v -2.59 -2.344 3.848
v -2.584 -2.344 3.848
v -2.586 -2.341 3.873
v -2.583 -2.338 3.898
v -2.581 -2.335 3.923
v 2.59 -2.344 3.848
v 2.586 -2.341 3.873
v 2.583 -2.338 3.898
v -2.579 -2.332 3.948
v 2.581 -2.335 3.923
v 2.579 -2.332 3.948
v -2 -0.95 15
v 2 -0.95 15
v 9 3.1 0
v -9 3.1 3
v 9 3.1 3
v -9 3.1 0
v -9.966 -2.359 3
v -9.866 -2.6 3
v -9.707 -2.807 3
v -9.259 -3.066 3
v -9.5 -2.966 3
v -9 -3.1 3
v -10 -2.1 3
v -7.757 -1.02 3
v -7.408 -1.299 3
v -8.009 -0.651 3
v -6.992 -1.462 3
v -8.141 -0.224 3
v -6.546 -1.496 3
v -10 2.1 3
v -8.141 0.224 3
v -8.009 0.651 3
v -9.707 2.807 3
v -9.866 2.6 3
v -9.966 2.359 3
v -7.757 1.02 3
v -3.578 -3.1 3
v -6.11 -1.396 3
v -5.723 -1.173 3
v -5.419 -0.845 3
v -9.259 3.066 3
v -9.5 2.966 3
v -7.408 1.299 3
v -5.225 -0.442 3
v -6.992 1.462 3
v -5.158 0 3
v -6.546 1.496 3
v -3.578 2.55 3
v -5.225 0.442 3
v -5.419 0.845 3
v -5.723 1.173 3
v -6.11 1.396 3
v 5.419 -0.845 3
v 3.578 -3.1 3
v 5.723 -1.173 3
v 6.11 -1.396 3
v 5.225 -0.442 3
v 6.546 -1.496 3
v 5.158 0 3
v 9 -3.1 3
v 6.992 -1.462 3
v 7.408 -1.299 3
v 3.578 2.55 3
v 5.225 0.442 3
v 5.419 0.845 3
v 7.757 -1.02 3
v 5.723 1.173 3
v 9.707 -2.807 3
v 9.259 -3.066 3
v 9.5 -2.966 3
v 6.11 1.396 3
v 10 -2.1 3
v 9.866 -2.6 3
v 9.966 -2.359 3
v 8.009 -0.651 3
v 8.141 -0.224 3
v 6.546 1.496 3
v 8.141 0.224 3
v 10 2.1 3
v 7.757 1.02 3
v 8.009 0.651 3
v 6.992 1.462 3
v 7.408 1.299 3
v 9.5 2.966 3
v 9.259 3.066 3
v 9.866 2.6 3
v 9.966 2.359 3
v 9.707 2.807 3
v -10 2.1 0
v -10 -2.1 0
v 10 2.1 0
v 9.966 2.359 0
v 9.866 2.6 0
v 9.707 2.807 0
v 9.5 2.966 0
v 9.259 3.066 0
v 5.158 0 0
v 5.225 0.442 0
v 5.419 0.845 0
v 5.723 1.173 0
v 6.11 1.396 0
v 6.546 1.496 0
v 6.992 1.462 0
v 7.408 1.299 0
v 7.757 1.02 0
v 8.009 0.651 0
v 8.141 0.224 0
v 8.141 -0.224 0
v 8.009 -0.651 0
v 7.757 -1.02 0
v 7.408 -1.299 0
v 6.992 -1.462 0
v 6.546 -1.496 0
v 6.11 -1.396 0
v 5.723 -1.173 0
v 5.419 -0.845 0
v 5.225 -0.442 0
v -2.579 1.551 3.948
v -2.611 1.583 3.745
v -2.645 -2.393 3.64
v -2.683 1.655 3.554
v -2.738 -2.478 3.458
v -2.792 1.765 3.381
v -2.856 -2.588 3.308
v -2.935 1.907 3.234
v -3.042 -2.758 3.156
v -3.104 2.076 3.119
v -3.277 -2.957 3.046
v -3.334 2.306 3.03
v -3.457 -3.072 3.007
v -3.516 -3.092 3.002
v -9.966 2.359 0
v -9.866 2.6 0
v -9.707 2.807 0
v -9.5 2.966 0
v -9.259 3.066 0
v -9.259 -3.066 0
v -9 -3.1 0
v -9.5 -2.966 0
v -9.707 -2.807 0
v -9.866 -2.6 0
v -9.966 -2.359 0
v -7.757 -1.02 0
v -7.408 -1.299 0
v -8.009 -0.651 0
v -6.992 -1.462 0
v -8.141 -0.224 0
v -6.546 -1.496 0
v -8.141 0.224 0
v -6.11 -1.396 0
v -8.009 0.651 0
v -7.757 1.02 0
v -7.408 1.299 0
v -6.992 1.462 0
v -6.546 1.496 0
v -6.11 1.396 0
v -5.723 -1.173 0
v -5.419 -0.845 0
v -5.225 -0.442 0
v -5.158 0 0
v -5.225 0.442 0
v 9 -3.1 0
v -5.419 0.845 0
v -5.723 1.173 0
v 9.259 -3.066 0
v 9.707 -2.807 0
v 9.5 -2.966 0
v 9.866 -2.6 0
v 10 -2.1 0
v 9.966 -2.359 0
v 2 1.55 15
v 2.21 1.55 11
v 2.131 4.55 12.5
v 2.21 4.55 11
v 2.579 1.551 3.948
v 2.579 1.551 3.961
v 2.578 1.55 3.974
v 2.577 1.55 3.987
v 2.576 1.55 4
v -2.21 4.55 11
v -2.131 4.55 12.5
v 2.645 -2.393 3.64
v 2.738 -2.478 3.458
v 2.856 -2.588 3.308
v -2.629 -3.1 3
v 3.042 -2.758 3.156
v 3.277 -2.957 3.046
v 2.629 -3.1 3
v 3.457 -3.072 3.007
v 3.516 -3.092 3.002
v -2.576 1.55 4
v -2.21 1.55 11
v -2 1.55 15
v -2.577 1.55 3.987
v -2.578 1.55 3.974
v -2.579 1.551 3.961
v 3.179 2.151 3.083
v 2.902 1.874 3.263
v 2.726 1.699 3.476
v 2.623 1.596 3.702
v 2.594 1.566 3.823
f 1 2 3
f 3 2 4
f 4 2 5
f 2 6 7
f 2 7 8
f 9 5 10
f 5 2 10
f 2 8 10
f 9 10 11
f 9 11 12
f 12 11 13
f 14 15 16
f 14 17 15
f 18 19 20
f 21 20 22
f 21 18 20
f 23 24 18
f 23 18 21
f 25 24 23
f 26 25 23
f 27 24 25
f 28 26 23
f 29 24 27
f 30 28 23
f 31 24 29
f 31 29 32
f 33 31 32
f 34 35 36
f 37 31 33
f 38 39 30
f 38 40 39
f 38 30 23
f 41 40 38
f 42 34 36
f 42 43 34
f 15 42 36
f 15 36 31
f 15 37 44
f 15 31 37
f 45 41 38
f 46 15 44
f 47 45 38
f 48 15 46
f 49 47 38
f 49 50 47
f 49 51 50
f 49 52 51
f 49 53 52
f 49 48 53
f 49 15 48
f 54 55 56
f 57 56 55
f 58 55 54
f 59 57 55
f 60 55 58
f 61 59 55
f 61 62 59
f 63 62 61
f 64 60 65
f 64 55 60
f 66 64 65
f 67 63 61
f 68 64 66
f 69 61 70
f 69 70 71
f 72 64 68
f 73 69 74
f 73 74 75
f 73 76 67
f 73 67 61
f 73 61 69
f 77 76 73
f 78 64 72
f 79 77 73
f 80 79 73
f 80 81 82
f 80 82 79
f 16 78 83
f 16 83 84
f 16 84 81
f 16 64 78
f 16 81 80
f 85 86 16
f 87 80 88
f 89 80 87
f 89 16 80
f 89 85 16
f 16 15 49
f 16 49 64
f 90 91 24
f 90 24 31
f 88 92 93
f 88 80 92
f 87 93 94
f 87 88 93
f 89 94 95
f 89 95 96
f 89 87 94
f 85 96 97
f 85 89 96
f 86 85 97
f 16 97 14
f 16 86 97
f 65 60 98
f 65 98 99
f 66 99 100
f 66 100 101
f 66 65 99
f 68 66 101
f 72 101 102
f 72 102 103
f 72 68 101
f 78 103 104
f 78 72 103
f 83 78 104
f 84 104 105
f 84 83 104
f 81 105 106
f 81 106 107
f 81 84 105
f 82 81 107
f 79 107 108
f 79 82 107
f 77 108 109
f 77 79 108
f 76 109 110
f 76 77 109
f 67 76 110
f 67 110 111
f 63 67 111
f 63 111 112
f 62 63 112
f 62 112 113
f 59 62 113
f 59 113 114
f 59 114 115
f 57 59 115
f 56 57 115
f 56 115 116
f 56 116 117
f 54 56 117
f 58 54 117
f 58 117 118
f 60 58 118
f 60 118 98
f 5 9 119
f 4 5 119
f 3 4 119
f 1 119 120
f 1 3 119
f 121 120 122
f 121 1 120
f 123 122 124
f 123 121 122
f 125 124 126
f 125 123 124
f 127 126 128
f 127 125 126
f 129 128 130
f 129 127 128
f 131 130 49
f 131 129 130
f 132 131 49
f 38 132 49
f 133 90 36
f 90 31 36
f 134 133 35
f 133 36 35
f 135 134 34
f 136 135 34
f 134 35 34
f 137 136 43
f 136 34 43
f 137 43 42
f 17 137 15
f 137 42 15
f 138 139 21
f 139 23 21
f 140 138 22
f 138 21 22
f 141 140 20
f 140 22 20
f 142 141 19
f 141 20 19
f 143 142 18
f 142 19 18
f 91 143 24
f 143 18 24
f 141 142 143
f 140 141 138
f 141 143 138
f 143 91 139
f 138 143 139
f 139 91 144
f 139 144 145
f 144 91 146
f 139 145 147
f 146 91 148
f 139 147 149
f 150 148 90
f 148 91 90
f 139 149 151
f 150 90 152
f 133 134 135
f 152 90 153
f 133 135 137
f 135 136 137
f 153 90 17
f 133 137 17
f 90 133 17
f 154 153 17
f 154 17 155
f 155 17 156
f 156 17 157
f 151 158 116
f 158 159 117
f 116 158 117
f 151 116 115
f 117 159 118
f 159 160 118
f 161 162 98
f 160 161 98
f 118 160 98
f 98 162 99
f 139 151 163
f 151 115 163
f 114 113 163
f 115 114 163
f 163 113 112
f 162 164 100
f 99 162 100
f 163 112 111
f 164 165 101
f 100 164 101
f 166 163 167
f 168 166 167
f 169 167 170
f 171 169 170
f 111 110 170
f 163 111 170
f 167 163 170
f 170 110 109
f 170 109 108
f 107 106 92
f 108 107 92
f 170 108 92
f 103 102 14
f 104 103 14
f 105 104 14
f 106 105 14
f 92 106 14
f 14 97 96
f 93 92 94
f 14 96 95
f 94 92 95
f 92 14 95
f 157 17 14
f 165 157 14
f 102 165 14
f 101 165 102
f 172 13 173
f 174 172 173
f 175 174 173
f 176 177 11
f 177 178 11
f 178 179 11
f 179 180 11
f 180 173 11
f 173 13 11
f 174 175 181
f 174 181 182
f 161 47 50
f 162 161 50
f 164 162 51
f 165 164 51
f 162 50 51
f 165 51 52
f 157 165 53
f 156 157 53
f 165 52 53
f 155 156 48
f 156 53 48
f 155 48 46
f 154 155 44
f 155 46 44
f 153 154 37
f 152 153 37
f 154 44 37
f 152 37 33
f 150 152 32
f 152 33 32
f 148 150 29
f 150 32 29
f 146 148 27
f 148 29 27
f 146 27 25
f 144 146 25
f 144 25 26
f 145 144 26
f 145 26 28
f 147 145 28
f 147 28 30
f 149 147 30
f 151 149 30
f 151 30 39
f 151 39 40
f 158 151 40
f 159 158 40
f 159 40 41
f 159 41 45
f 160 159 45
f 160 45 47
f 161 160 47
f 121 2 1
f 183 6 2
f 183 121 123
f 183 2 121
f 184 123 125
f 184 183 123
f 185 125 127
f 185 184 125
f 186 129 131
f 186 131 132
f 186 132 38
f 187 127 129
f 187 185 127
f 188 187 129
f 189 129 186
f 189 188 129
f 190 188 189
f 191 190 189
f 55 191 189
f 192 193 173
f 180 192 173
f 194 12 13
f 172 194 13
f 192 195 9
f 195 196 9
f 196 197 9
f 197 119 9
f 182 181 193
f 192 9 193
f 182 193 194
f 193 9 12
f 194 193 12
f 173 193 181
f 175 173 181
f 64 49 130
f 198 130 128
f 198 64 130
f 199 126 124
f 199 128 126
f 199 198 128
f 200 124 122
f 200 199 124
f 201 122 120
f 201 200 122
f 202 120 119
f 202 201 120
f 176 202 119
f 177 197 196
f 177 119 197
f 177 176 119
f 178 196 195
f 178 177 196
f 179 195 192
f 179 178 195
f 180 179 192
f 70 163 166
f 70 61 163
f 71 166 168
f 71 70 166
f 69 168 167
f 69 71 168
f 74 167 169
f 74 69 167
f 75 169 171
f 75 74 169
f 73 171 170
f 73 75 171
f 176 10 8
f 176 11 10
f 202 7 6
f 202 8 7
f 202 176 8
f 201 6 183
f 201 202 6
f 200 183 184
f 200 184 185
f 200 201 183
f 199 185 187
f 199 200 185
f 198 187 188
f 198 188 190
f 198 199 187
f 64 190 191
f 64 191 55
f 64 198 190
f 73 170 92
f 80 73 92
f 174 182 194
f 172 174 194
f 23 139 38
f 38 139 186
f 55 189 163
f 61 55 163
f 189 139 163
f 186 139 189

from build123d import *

# Parameters (mm, degrees)
SKETCH1_W           = 20
SKETCH1_H           = 6.2
BOSS_EXTRUDE1_DEPTH = 3
SNAP_START          = -0.95
SNAP_HOOK1_DEPTH    = 2.5
SNAP_START_2        = -1.274844
SNAP_HOOK1_2_DEPTH  = 2.48
SNAP_START_3        = -2.209631117
SNAP_HOOK1_3_DEPTH  = 4.419262234
SNAP_START_4        = -2.628893351
SNAP_HOOK1_4_DEPTH  = 5.257786702
SNAP_START_5        = -3
SNAP_HOOK1_5_DEPTH  = 9
FILLET1_R           = 1
CUT_EXTRUDE1_REACH  = 18.27
SKETCH3_R           = 1.5
FILLET2_R           = 1


with BuildPart() as part:
    # Sketch1 → Boss-Extrude1 (new body)
    with BuildSketch(Plane.XY):
        Rectangle(SKETCH1_W, SKETCH1_H)
    extrude(amount=BOSS_EXTRUDE1_DEPTH)

    # Snap Hook1: read off the stored shape, not the designer's step
    # Snap Hook1 outline → Snap Hook1 (add)
    with BuildSketch(Plane(origin=(0, 0, 0), x_dir=(1, 0, 0), z_dir=(0, 1, 0)).offset(SNAP_START)):
        Polygon((2.628893351, -3), (-2.628893351, -3), (-2, -15), (2, -15), align=None)
    extrude(amount=SNAP_HOOK1_DEPTH)

    # Snap Hook1 2 outline → Snap Hook1 2 (add)
    with BuildSketch(Plane(origin=(0, 0, 0), x_dir=(1, 0, 0), z_dir=(0, 1, 0)).offset(SNAP_START_2)):
        Polygon((2.628893351, -3), (-2.628893351, -3), (-2.209631117, -11), (2.209631117, -11), align=None)
    extrude(amount=SNAP_HOOK1_2_DEPTH)

    # Snap Hook1 3 outline → Snap Hook1 3 (add)
    with BuildSketch(Plane.YZ.offset(SNAP_START_3)):
        Polygon((-0.95, 11), (-0.95, 15), (-2.45, 3), (-1.274844, 3), (-1.274844, 11), align=None)
        Polygon((1.55, 15), (1.55, 11), (4.55, 11), (4.55, 12.5), align=None)
    extrude(amount=SNAP_HOOK1_3_DEPTH)

    # Snap Hook1 4 outline → Snap Hook1 4 (add)
    with BuildSketch(Plane.YZ.offset(SNAP_START_4)):
        Polygon((-0.95, 11), (-0.95, 15), (-2.45, 3), (-1.274844, 3), (-1.274844, 11), align=None)
    extrude(amount=SNAP_HOOK1_4_DEPTH)

    # Snap Hook1 5 outline → Snap Hook1 5 (cut)
    with BuildSketch(Plane(origin=(0, 0, 0), x_dir=(1, 0, 0), z_dir=(0, 1, 0)).offset(SNAP_START_5)):
        Polygon((-2.628893351, -3), (-2.628893351, -16), (-1.947592221, -16), (-2, -15), align=None)
        Polygon((2, -15), (1.947592221, -16), (2.628893351, -16), (2.628893351, -3), align=None)
    extrude(amount=SNAP_HOOK1_5_DEPTH, mode=Mode.SUBTRACT)

    # Fillet1
    # the kernel refuses this fillet: 1 mm, written as the material it adds along each edge
    with BuildSketch(Plane(origin=(5.128893351, 1.55, 3), x_dir=(0, 1, 0), z_dir=(-1, 0, 0))) as fillet1_piece_1_section:
        with BuildLine():
            CenterArc((FILLET1_R, -FILLET1_R), FILLET1_R, 90, 90)
            Line((0, -FILLET1_R), (-FILLET1_R * 0.02, -FILLET1_R))
            Line((-FILLET1_R * 0.02, -FILLET1_R), (-FILLET1_R * 0.02, FILLET1_R * 0.02))
            Line((-FILLET1_R * 0.02, FILLET1_R * 0.02), (FILLET1_R, FILLET1_R * 0.02))
            Line((FILLET1_R, FILLET1_R * 0.02), (FILLET1_R, 0))
        make_face()
    fillet1_piece_1 = extrude(amount=10.257786702, mode=Mode.PRIVATE)
    fillet1_piece_1 = split(fillet1_piece_1, bisect_by=Plane(origin=(-2.607644367, 1.55, 3.405454761), z_dir=(0.9986295347562985, 0, -0.05233595621003828)), keep=Keep.TOP, mode=Mode.PRIVATE)
    fillet1_piece_1 = split(fillet1_piece_1, bisect_by=Plane(origin=(2.635740982, 1.55, 2.869339421), z_dir=(-0.9986295347562985, 0, -0.0523359562100383)), keep=Keep.TOP, mode=Mode.PRIVATE)
    add(fillet1_piece_1)
    with BuildSketch(Plane(origin=(2.628893351, 1.55, 3), x_dir=(1, 0, 0), z_dir=(0, -1, 0))) as fillet1_piece_2_section:
        with BuildLine():
            CenterArc((FILLET1_R * 0.948964566746, FILLET1_R), FILLET1_R, 182.999999998, 87.000000002)
            Line((-FILLET1_R * 0.0496649680101, FILLET1_R * 0.94766404379), (-FILLET1_R * 0.0696375587052, FILLET1_R * 0.946617324666))
            Line((-FILLET1_R * 0.0696375587052, FILLET1_R * 0.946617324666), (-FILLET1_R * 0.0189792913349, -FILLET1_R * 0.02))
            Line((-FILLET1_R * 0.0189792913349, -FILLET1_R * 0.02), (FILLET1_R * 0.948964566746, -FILLET1_R * 0.02))
            Line((FILLET1_R * 0.948964566746, -FILLET1_R * 0.02), (FILLET1_R * 0.948964566746, 0))
        make_face()
    fillet1_piece_2 = extrude(amount=6.372411417, mode=Mode.PRIVATE)
    fillet1_piece_2 = split(fillet1_piece_2, bisect_by=Plane(origin=(2.628893351, -2.388461538, 3.492307692), z_dir=(0, 0.9922778767136677, -0.12403473458920848)), keep=Keep.TOP, mode=Mode.PRIVATE)
    add(fillet1_piece_2)
    with BuildSketch(Plane(origin=(4.76448426, -2.45, 3), x_dir=(0, -1, 0), z_dir=(-1, 0, 0))) as fillet1_piece_3_section:
        with BuildLine():
            CenterArc((0.886322896, 0.97167458), FILLET1_R, 187.125016349, 69.205367851)
            Line((-0.105954981, 0.847639845), (-0.125800538, 0.84515915))
            Line((-0.125800538, 0.84515915), (-0.019845558, -0.002480695))
            Line((-0.019845558, -0.002480695), (0, -0.02))
            ThreePointArc((0, -0.02), (0.325, -0.02), (0.645273542, -0.019433492))
            Line((0.645273542, -0.019433492), (0.65, 0))
        make_face()
    fillet1_piece_3 = extrude(amount=9.52896852, mode=Mode.PRIVATE)
    fillet1_piece_3 = split(fillet1_piece_3, bisect_by=Plane(origin=(2.634742846, -2.45, 2.888384982), z_dir=(-0.9986295347562985, 0, -0.0523359562100383)), keep=Keep.TOP, mode=Mode.PRIVATE)
    fillet1_piece_3 = split(fillet1_piece_3, bisect_by=Plane(origin=(-2.608642503, -2.45, 3.3864092), z_dir=(0.9986295347562985, 0, -0.05233595621003828)), keep=Keep.TOP, mode=Mode.PRIVATE)
    add(fillet1_piece_3)
    with BuildSketch(Plane(origin=(-2.628893351, -4.822411417, 3), x_dir=(-1, 0, 0), z_dir=(0, 1, 0))) as fillet1_piece_4_section:
        with BuildLine():
            CenterArc((FILLET1_R * 0.948964566746, FILLET1_R), FILLET1_R, 182.999999998, 87.000000002)
            Line((-FILLET1_R * 0.0496649680101, FILLET1_R * 0.94766404379), (-FILLET1_R * 0.0696375587052, FILLET1_R * 0.946617324666))
            Line((-FILLET1_R * 0.0696375587052, FILLET1_R * 0.946617324666), (-FILLET1_R * 0.0189792913349, -FILLET1_R * 0.02))
            Line((-FILLET1_R * 0.0189792913349, -FILLET1_R * 0.02), (FILLET1_R * 0.948964566746, -FILLET1_R * 0.02))
            Line((FILLET1_R * 0.948964566746, -FILLET1_R * 0.02), (FILLET1_R * 0.948964566746, 0))
        make_face()
    fillet1_piece_4 = extrude(amount=6.372411417, mode=Mode.PRIVATE)
    fillet1_piece_4 = split(fillet1_piece_4, bisect_by=Plane(origin=(-2.628893351, -2.486498637, 2.708010903), z_dir=(0, 0.9922778767136677, -0.12403473458920848)), keep=Keep.TOP, mode=Mode.PRIVATE)
    add(fillet1_piece_4)
    with BuildSketch(Plane(origin=(2.628893351, 3.922411417, 3), x_dir=(1, 0, 0), z_dir=(0, -1, 0))) as fillet1_piece_5a_section:
        with BuildLine():
            CenterArc((FILLET1_R * 0.948964566746, FILLET1_R), FILLET1_R, 182.999999998, 87.000000002)
            Line((-FILLET1_R * 0.0496649680101, FILLET1_R * 0.94766404379), (-FILLET1_R * 0.0696375587052, FILLET1_R * 0.946617324666))
            Line((-FILLET1_R * 0.0696375587052, FILLET1_R * 0.946617324666), (-FILLET1_R * 0.0189792913349, -FILLET1_R * 0.02))
            Line((-FILLET1_R * 0.0189792913349, -FILLET1_R * 0.02), (FILLET1_R * 0.948964566746, -FILLET1_R * 0.02))
            Line((FILLET1_R * 0.948964566746, -FILLET1_R * 0.02), (FILLET1_R * 0.948964566746, 0))
        make_face()
    fillet1_piece_5a = extrude(amount=8.744822834, mode=Mode.PRIVATE)
    fillet1_piece_5a = split(fillet1_piece_5a, bisect_by=Plane(origin=(2.628893351, 3.1, 3), z_dir=(0, -1, 0)), keep=Keep.TOP, mode=Mode.PRIVATE)
    fillet1_piece_5a = split(fillet1_piece_5a, bisect_by=Plane(origin=(2.628893351, 1.55, 3), z_dir=(0, 1, 0)), keep=Keep.TOP, mode=Mode.PRIVATE)
    with BuildSketch(Plane(origin=(5.128893351, 1.55, 3), x_dir=(0, 1, 0), z_dir=(-1, 0, 0))) as fillet1_piece_5b_section:
        with BuildLine():
            CenterArc((FILLET1_R, -FILLET1_R), FILLET1_R, 90, 90)
            Line((0, -FILLET1_R), (-FILLET1_R * 0.02, -FILLET1_R))
            Line((-FILLET1_R * 0.02, -FILLET1_R), (-FILLET1_R * 0.02, FILLET1_R * 0.02))
            Line((-FILLET1_R * 0.02, FILLET1_R * 0.02), (FILLET1_R, FILLET1_R * 0.02))
            Line((FILLET1_R, FILLET1_R * 0.02), (FILLET1_R, 0))
        make_face()
    fillet1_piece_5b = extrude(amount=10.257786702, mode=Mode.PRIVATE)
    fillet1_piece_5b = split(fillet1_piece_5b, bisect_by=Plane(origin=(2.635740982, 1.55, 2.869339421), z_dir=(0.9986295347562985, 0, 0.0523359562100383)), keep=Keep.TOP, mode=Mode.PRIVATE)
    fillet1_piece_5 = fillet1_piece_5a & fillet1_piece_5b
    add(fillet1_piece_5)
    with BuildSketch(Plane(origin=(5.128893351, 1.55, 3), x_dir=(0, 1, 0), z_dir=(-1, 0, 0))) as fillet1_piece_6a_section:
        with BuildLine():
            CenterArc((FILLET1_R, -FILLET1_R), FILLET1_R, 90, 90)
            Line((0, -FILLET1_R), (-FILLET1_R * 0.02, -FILLET1_R))
            Line((-FILLET1_R * 0.02, -FILLET1_R), (-FILLET1_R * 0.02, FILLET1_R * 0.02))
            Line((-FILLET1_R * 0.02, FILLET1_R * 0.02), (FILLET1_R, FILLET1_R * 0.02))
            Line((FILLET1_R, FILLET1_R * 0.02), (FILLET1_R, 0))
        make_face()
    fillet1_piece_6a = extrude(amount=10.257786702, mode=Mode.PRIVATE)
    fillet1_piece_6a = split(fillet1_piece_6a, bisect_by=Plane(origin=(-2.607644367, 1.55, 3.405454761), z_dir=(-0.9986295347562985, 0, 0.05233595621003828)), keep=Keep.TOP, mode=Mode.PRIVATE)
    with BuildSketch(Plane(origin=(-2.628893351, -4.822411417, 3), x_dir=(-1, 0, 0), z_dir=(0, 1, 0))) as fillet1_piece_6b_section:
        with BuildLine():
            CenterArc((FILLET1_R * 0.948964566746, FILLET1_R), FILLET1_R, 182.999999998, 87.000000002)
            Line((-FILLET1_R * 0.0496649680101, FILLET1_R * 0.94766404379), (-FILLET1_R * 0.0696375587052, FILLET1_R * 0.946617324666))
            Line((-FILLET1_R * 0.0696375587052, FILLET1_R * 0.946617324666), (-FILLET1_R * 0.0189792913349, -FILLET1_R * 0.02))
            Line((-FILLET1_R * 0.0189792913349, -FILLET1_R * 0.02), (FILLET1_R * 0.948964566746, -FILLET1_R * 0.02))
            Line((FILLET1_R * 0.948964566746, -FILLET1_R * 0.02), (FILLET1_R * 0.948964566746, 0))
        make_face()
    fillet1_piece_6b = extrude(amount=8.744822834, mode=Mode.PRIVATE)
    fillet1_piece_6b = split(fillet1_piece_6b, bisect_by=Plane(origin=(-2.628893351, 3.1, 3), z_dir=(0, -1, 0)), keep=Keep.TOP, mode=Mode.PRIVATE)
    fillet1_piece_6b = split(fillet1_piece_6b, bisect_by=Plane(origin=(-2.628893351, 1.55, 3), z_dir=(0, 1, 0)), keep=Keep.TOP, mode=Mode.PRIVATE)
    fillet1_piece_6 = fillet1_piece_6a & fillet1_piece_6b
    add(fillet1_piece_6)
    with BuildSketch(Plane(origin=(2.628893351, 1.55, 3), x_dir=(1, 0, 0), z_dir=(0, -1, 0))) as fillet1_piece_7a_section:
        with BuildLine():
            CenterArc((FILLET1_R * 0.948964566746, FILLET1_R), FILLET1_R, 182.999999998, 87.000000002)
            Line((-FILLET1_R * 0.0496649680101, FILLET1_R * 0.94766404379), (-FILLET1_R * 0.0696375587052, FILLET1_R * 0.946617324666))
            Line((-FILLET1_R * 0.0696375587052, FILLET1_R * 0.946617324666), (-FILLET1_R * 0.0189792913349, -FILLET1_R * 0.02))
            Line((-FILLET1_R * 0.0189792913349, -FILLET1_R * 0.02), (FILLET1_R * 0.948964566746, -FILLET1_R * 0.02))
            Line((FILLET1_R * 0.948964566746, -FILLET1_R * 0.02), (FILLET1_R * 0.948964566746, 0))
        make_face()
    fillet1_piece_7a = extrude(amount=6.372411417, mode=Mode.PRIVATE)
    fillet1_piece_7a = split(fillet1_piece_7a, bisect_by=Plane(origin=(2.628893351, -3.1, 3), z_dir=(0, 1, 0)), keep=Keep.TOP, mode=Mode.PRIVATE)
    fillet1_piece_7a = split(fillet1_piece_7a, bisect_by=Plane(origin=(2.628893351, -2.388461538, 3.492307692), z_dir=(0, -0.9922778767136677, 0.12403473458920848)), keep=Keep.TOP, mode=Mode.PRIVATE)
    with BuildSketch(Plane(origin=(4.76448426, -2.45, 3), x_dir=(0, -1, 0), z_dir=(-1, 0, 0))) as fillet1_piece_7b_section:
        with BuildLine():
            CenterArc((0.886322896, 0.97167458), FILLET1_R, 187.125016349, 69.205367851)
            Line((-0.105954981, 0.847639845), (-0.125800538, 0.84515915))
            Line((-0.125800538, 0.84515915), (-0.019845558, -0.002480695))
            Line((-0.019845558, -0.002480695), (0, -0.02))
            ThreePointArc((0, -0.02), (0.325, -0.02), (0.645273542, -0.019433492))
            Line((0.645273542, -0.019433492), (0.65, 0))
        make_face()
    fillet1_piece_7b = extrude(amount=9.52896852, mode=Mode.PRIVATE)
    fillet1_piece_7b = split(fillet1_piece_7b, bisect_by=Plane(origin=(2.634742846, -2.45, 2.888384982), z_dir=(0.9986295347562985, 0, 0.0523359562100383)), keep=Keep.TOP, mode=Mode.PRIVATE)
    fillet1_piece_7 = fillet1_piece_7a & fillet1_piece_7b
    add(fillet1_piece_7)
    with BuildSketch(Plane(origin=(-2.628893351, -4.822411417, 3), x_dir=(-1, 0, 0), z_dir=(0, 1, 0))) as fillet1_piece_8a_section:
        with BuildLine():
            CenterArc((FILLET1_R * 0.948964566746, FILLET1_R), FILLET1_R, 182.999999998, 87.000000002)
            Line((-FILLET1_R * 0.0496649680101, FILLET1_R * 0.94766404379), (-FILLET1_R * 0.0696375587052, FILLET1_R * 0.946617324666))
            Line((-FILLET1_R * 0.0696375587052, FILLET1_R * 0.946617324666), (-FILLET1_R * 0.0189792913349, -FILLET1_R * 0.02))
            Line((-FILLET1_R * 0.0189792913349, -FILLET1_R * 0.02), (FILLET1_R * 0.948964566746, -FILLET1_R * 0.02))
            Line((FILLET1_R * 0.948964566746, -FILLET1_R * 0.02), (FILLET1_R * 0.948964566746, 0))
        make_face()
    fillet1_piece_8a = extrude(amount=6.372411417, mode=Mode.PRIVATE)
    fillet1_piece_8a = split(fillet1_piece_8a, bisect_by=Plane(origin=(-2.628893351, -3.1, 3), z_dir=(0, 1, 0)), keep=Keep.TOP, mode=Mode.PRIVATE)
    fillet1_piece_8a = split(fillet1_piece_8a, bisect_by=Plane(origin=(-2.628893351, -2.486498637, 2.708010903), z_dir=(0, -0.9922778767136677, 0.12403473458920848)), keep=Keep.TOP, mode=Mode.PRIVATE)
    with BuildSketch(Plane(origin=(4.76448426, -2.45, 3), x_dir=(0, -1, 0), z_dir=(-1, 0, 0))) as fillet1_piece_8b_section:
        with BuildLine():
            CenterArc((0.886322896, 0.97167458), FILLET1_R, 187.125016349, 69.205367851)
            Line((-0.105954981, 0.847639845), (-0.125800538, 0.84515915))
            Line((-0.125800538, 0.84515915), (-0.019845558, -0.002480695))
            Line((-0.019845558, -0.002480695), (0, -0.02))
            ThreePointArc((0, -0.02), (0.325, -0.02), (0.645273542, -0.019433492))
            Line((0.645273542, -0.019433492), (0.65, 0))
        make_face()
    fillet1_piece_8b = extrude(amount=9.52896852, mode=Mode.PRIVATE)
    fillet1_piece_8b = split(fillet1_piece_8b, bisect_by=Plane(origin=(-2.608642503, -2.45, 3.3864092), z_dir=(-0.9986295347562985, 0, 0.05233595621003828)), keep=Keep.TOP, mode=Mode.PRIVATE)
    fillet1_piece_8 = fillet1_piece_8a & fillet1_piece_8b
    add(fillet1_piece_8)

    # Sketch3 → Cut-Extrude1 (cut, up to next)
    with BuildSketch(Plane.XY.offset(3), mode=Mode.PRIVATE) as cut_extrude1_sk1:
        with Locations((-6.65790951, 0)):
            Circle(SKETCH3_R)
    cut_extrude1_tool1 = extrude(cut_extrude1_sk1.sketch, amount=-CUT_EXTRUDE1_REACH, mode=Mode.PRIVATE) & part.part
    cut_extrude1 = cut_extrude1_tool1.solids().sort_by_distance((-6.65791, 0, 3))[0]
    add(cut_extrude1, mode=Mode.SUBTRACT)

    # Mirror1: Cut-Extrude1 across plane
    add(cut_extrude1.mirror(Plane(origin=(0, 0, 0), x_dir=(0, 0, 1), z_dir=(1, 0, 0))), mode=Mode.SUBTRACT)

    # Fillet2
    fillet2_edges = [part.edges().sort_by_distance(p)[0] for p in [
        (10, -3.1, 1.5),
        (-10, -3.1, 1.5),
        (-10, 3.1, 1.5),
        (10, 3.1, 1.5),
    ]]
    fillet(fillet2_edges, radius=FILLET2_R)


solid = part.part
